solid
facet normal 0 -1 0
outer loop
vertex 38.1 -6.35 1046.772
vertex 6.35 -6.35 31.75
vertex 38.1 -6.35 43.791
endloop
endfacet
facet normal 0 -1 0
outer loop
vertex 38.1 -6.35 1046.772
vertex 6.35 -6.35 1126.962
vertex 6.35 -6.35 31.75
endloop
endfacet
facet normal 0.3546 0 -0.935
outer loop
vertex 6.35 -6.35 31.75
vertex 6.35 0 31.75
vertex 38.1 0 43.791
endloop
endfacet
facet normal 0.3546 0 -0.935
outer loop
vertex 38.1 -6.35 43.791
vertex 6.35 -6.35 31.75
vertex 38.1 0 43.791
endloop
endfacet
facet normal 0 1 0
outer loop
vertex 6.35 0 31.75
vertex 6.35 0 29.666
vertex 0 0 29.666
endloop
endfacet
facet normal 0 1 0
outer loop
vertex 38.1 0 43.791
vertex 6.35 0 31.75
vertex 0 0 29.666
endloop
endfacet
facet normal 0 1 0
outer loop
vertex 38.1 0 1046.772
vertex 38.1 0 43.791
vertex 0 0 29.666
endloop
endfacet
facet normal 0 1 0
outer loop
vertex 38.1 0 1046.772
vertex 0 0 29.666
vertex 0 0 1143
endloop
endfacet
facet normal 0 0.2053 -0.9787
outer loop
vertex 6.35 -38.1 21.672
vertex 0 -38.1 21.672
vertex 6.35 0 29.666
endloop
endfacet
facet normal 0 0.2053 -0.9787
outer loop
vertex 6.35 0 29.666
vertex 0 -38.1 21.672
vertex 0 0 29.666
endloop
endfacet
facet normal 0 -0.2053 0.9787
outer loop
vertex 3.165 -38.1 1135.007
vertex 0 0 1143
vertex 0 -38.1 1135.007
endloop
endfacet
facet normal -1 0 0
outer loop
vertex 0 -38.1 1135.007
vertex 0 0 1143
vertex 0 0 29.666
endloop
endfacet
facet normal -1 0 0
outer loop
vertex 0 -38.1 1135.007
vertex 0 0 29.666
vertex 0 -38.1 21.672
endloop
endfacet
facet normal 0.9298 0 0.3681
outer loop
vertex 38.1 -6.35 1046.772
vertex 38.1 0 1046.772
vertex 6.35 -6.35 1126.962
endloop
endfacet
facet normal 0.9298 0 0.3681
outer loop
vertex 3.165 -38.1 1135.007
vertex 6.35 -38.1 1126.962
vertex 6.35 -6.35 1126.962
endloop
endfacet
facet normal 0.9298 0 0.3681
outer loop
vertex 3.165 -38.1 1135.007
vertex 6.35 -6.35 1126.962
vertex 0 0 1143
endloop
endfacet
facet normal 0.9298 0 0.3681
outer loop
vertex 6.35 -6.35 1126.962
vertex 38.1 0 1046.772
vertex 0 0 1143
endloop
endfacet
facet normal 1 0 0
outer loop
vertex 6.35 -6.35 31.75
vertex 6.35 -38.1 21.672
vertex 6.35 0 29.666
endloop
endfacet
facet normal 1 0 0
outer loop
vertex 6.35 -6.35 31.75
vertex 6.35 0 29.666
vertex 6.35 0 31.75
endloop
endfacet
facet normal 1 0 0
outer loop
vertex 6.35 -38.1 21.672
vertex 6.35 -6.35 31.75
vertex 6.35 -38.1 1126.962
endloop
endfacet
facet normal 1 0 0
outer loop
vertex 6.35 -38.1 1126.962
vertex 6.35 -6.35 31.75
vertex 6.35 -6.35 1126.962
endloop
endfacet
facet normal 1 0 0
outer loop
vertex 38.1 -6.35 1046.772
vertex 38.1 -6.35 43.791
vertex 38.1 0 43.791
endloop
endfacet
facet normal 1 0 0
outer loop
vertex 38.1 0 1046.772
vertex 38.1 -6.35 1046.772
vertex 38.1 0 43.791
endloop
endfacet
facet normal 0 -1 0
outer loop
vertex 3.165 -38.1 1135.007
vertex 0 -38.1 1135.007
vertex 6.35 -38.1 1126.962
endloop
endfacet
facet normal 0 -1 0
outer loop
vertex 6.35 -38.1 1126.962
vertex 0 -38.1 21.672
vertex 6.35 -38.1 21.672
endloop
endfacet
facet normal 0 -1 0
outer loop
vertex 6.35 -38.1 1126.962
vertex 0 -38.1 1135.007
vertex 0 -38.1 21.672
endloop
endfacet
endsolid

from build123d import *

# Parameters (mm, degrees)
BOSS_EXTRUDE1_DEPTH = 1143
Y_FACE_DEPTH        = 39.1
X_FACE_DEPTH        = 39.1


with BuildPart() as part:
    # Sketch2 → Boss-Extrude1 (new body)
    with BuildSketch(Plane.XY):
        Polygon((0, 0), (0, -38.1), (6.35, -38.1), (6.35, -6.35), (38.1, -6.35), (38.1, 0), align=None)
    extrude(amount=BOSS_EXTRUDE1_DEPTH)

    # Sketch3 → Y Face (cut, through all)
    with BuildSketch(Plane(origin=(0, 0, 0), x_dir=(1, 0, 0), z_dir=(0, 1, 0))):
        Polygon((6.35, 0), (6.35, -31.75), (38.1, -43.790982062), (38.1, 0), align=None)
        Polygon((38.1, -1046.772380605), (0, -1143), (38.1, -1143), align=None)
    extrude(amount=-Y_FACE_DEPTH, mode=Mode.SUBTRACT)

    # Sketch4 → X Face (cut, through all)
    with BuildSketch(Plane.ZY):
        Polygon((1143, 0), (1135.00664554, -38.1), (1143, -38.1), align=None)
        Polygon((0, -38.1), (21.672171987, -38.1), (29.665526448, 0), (0, 0), align=None)
    extrude(amount=-X_FACE_DEPTH, mode=Mode.SUBTRACT)


solid = part.part
